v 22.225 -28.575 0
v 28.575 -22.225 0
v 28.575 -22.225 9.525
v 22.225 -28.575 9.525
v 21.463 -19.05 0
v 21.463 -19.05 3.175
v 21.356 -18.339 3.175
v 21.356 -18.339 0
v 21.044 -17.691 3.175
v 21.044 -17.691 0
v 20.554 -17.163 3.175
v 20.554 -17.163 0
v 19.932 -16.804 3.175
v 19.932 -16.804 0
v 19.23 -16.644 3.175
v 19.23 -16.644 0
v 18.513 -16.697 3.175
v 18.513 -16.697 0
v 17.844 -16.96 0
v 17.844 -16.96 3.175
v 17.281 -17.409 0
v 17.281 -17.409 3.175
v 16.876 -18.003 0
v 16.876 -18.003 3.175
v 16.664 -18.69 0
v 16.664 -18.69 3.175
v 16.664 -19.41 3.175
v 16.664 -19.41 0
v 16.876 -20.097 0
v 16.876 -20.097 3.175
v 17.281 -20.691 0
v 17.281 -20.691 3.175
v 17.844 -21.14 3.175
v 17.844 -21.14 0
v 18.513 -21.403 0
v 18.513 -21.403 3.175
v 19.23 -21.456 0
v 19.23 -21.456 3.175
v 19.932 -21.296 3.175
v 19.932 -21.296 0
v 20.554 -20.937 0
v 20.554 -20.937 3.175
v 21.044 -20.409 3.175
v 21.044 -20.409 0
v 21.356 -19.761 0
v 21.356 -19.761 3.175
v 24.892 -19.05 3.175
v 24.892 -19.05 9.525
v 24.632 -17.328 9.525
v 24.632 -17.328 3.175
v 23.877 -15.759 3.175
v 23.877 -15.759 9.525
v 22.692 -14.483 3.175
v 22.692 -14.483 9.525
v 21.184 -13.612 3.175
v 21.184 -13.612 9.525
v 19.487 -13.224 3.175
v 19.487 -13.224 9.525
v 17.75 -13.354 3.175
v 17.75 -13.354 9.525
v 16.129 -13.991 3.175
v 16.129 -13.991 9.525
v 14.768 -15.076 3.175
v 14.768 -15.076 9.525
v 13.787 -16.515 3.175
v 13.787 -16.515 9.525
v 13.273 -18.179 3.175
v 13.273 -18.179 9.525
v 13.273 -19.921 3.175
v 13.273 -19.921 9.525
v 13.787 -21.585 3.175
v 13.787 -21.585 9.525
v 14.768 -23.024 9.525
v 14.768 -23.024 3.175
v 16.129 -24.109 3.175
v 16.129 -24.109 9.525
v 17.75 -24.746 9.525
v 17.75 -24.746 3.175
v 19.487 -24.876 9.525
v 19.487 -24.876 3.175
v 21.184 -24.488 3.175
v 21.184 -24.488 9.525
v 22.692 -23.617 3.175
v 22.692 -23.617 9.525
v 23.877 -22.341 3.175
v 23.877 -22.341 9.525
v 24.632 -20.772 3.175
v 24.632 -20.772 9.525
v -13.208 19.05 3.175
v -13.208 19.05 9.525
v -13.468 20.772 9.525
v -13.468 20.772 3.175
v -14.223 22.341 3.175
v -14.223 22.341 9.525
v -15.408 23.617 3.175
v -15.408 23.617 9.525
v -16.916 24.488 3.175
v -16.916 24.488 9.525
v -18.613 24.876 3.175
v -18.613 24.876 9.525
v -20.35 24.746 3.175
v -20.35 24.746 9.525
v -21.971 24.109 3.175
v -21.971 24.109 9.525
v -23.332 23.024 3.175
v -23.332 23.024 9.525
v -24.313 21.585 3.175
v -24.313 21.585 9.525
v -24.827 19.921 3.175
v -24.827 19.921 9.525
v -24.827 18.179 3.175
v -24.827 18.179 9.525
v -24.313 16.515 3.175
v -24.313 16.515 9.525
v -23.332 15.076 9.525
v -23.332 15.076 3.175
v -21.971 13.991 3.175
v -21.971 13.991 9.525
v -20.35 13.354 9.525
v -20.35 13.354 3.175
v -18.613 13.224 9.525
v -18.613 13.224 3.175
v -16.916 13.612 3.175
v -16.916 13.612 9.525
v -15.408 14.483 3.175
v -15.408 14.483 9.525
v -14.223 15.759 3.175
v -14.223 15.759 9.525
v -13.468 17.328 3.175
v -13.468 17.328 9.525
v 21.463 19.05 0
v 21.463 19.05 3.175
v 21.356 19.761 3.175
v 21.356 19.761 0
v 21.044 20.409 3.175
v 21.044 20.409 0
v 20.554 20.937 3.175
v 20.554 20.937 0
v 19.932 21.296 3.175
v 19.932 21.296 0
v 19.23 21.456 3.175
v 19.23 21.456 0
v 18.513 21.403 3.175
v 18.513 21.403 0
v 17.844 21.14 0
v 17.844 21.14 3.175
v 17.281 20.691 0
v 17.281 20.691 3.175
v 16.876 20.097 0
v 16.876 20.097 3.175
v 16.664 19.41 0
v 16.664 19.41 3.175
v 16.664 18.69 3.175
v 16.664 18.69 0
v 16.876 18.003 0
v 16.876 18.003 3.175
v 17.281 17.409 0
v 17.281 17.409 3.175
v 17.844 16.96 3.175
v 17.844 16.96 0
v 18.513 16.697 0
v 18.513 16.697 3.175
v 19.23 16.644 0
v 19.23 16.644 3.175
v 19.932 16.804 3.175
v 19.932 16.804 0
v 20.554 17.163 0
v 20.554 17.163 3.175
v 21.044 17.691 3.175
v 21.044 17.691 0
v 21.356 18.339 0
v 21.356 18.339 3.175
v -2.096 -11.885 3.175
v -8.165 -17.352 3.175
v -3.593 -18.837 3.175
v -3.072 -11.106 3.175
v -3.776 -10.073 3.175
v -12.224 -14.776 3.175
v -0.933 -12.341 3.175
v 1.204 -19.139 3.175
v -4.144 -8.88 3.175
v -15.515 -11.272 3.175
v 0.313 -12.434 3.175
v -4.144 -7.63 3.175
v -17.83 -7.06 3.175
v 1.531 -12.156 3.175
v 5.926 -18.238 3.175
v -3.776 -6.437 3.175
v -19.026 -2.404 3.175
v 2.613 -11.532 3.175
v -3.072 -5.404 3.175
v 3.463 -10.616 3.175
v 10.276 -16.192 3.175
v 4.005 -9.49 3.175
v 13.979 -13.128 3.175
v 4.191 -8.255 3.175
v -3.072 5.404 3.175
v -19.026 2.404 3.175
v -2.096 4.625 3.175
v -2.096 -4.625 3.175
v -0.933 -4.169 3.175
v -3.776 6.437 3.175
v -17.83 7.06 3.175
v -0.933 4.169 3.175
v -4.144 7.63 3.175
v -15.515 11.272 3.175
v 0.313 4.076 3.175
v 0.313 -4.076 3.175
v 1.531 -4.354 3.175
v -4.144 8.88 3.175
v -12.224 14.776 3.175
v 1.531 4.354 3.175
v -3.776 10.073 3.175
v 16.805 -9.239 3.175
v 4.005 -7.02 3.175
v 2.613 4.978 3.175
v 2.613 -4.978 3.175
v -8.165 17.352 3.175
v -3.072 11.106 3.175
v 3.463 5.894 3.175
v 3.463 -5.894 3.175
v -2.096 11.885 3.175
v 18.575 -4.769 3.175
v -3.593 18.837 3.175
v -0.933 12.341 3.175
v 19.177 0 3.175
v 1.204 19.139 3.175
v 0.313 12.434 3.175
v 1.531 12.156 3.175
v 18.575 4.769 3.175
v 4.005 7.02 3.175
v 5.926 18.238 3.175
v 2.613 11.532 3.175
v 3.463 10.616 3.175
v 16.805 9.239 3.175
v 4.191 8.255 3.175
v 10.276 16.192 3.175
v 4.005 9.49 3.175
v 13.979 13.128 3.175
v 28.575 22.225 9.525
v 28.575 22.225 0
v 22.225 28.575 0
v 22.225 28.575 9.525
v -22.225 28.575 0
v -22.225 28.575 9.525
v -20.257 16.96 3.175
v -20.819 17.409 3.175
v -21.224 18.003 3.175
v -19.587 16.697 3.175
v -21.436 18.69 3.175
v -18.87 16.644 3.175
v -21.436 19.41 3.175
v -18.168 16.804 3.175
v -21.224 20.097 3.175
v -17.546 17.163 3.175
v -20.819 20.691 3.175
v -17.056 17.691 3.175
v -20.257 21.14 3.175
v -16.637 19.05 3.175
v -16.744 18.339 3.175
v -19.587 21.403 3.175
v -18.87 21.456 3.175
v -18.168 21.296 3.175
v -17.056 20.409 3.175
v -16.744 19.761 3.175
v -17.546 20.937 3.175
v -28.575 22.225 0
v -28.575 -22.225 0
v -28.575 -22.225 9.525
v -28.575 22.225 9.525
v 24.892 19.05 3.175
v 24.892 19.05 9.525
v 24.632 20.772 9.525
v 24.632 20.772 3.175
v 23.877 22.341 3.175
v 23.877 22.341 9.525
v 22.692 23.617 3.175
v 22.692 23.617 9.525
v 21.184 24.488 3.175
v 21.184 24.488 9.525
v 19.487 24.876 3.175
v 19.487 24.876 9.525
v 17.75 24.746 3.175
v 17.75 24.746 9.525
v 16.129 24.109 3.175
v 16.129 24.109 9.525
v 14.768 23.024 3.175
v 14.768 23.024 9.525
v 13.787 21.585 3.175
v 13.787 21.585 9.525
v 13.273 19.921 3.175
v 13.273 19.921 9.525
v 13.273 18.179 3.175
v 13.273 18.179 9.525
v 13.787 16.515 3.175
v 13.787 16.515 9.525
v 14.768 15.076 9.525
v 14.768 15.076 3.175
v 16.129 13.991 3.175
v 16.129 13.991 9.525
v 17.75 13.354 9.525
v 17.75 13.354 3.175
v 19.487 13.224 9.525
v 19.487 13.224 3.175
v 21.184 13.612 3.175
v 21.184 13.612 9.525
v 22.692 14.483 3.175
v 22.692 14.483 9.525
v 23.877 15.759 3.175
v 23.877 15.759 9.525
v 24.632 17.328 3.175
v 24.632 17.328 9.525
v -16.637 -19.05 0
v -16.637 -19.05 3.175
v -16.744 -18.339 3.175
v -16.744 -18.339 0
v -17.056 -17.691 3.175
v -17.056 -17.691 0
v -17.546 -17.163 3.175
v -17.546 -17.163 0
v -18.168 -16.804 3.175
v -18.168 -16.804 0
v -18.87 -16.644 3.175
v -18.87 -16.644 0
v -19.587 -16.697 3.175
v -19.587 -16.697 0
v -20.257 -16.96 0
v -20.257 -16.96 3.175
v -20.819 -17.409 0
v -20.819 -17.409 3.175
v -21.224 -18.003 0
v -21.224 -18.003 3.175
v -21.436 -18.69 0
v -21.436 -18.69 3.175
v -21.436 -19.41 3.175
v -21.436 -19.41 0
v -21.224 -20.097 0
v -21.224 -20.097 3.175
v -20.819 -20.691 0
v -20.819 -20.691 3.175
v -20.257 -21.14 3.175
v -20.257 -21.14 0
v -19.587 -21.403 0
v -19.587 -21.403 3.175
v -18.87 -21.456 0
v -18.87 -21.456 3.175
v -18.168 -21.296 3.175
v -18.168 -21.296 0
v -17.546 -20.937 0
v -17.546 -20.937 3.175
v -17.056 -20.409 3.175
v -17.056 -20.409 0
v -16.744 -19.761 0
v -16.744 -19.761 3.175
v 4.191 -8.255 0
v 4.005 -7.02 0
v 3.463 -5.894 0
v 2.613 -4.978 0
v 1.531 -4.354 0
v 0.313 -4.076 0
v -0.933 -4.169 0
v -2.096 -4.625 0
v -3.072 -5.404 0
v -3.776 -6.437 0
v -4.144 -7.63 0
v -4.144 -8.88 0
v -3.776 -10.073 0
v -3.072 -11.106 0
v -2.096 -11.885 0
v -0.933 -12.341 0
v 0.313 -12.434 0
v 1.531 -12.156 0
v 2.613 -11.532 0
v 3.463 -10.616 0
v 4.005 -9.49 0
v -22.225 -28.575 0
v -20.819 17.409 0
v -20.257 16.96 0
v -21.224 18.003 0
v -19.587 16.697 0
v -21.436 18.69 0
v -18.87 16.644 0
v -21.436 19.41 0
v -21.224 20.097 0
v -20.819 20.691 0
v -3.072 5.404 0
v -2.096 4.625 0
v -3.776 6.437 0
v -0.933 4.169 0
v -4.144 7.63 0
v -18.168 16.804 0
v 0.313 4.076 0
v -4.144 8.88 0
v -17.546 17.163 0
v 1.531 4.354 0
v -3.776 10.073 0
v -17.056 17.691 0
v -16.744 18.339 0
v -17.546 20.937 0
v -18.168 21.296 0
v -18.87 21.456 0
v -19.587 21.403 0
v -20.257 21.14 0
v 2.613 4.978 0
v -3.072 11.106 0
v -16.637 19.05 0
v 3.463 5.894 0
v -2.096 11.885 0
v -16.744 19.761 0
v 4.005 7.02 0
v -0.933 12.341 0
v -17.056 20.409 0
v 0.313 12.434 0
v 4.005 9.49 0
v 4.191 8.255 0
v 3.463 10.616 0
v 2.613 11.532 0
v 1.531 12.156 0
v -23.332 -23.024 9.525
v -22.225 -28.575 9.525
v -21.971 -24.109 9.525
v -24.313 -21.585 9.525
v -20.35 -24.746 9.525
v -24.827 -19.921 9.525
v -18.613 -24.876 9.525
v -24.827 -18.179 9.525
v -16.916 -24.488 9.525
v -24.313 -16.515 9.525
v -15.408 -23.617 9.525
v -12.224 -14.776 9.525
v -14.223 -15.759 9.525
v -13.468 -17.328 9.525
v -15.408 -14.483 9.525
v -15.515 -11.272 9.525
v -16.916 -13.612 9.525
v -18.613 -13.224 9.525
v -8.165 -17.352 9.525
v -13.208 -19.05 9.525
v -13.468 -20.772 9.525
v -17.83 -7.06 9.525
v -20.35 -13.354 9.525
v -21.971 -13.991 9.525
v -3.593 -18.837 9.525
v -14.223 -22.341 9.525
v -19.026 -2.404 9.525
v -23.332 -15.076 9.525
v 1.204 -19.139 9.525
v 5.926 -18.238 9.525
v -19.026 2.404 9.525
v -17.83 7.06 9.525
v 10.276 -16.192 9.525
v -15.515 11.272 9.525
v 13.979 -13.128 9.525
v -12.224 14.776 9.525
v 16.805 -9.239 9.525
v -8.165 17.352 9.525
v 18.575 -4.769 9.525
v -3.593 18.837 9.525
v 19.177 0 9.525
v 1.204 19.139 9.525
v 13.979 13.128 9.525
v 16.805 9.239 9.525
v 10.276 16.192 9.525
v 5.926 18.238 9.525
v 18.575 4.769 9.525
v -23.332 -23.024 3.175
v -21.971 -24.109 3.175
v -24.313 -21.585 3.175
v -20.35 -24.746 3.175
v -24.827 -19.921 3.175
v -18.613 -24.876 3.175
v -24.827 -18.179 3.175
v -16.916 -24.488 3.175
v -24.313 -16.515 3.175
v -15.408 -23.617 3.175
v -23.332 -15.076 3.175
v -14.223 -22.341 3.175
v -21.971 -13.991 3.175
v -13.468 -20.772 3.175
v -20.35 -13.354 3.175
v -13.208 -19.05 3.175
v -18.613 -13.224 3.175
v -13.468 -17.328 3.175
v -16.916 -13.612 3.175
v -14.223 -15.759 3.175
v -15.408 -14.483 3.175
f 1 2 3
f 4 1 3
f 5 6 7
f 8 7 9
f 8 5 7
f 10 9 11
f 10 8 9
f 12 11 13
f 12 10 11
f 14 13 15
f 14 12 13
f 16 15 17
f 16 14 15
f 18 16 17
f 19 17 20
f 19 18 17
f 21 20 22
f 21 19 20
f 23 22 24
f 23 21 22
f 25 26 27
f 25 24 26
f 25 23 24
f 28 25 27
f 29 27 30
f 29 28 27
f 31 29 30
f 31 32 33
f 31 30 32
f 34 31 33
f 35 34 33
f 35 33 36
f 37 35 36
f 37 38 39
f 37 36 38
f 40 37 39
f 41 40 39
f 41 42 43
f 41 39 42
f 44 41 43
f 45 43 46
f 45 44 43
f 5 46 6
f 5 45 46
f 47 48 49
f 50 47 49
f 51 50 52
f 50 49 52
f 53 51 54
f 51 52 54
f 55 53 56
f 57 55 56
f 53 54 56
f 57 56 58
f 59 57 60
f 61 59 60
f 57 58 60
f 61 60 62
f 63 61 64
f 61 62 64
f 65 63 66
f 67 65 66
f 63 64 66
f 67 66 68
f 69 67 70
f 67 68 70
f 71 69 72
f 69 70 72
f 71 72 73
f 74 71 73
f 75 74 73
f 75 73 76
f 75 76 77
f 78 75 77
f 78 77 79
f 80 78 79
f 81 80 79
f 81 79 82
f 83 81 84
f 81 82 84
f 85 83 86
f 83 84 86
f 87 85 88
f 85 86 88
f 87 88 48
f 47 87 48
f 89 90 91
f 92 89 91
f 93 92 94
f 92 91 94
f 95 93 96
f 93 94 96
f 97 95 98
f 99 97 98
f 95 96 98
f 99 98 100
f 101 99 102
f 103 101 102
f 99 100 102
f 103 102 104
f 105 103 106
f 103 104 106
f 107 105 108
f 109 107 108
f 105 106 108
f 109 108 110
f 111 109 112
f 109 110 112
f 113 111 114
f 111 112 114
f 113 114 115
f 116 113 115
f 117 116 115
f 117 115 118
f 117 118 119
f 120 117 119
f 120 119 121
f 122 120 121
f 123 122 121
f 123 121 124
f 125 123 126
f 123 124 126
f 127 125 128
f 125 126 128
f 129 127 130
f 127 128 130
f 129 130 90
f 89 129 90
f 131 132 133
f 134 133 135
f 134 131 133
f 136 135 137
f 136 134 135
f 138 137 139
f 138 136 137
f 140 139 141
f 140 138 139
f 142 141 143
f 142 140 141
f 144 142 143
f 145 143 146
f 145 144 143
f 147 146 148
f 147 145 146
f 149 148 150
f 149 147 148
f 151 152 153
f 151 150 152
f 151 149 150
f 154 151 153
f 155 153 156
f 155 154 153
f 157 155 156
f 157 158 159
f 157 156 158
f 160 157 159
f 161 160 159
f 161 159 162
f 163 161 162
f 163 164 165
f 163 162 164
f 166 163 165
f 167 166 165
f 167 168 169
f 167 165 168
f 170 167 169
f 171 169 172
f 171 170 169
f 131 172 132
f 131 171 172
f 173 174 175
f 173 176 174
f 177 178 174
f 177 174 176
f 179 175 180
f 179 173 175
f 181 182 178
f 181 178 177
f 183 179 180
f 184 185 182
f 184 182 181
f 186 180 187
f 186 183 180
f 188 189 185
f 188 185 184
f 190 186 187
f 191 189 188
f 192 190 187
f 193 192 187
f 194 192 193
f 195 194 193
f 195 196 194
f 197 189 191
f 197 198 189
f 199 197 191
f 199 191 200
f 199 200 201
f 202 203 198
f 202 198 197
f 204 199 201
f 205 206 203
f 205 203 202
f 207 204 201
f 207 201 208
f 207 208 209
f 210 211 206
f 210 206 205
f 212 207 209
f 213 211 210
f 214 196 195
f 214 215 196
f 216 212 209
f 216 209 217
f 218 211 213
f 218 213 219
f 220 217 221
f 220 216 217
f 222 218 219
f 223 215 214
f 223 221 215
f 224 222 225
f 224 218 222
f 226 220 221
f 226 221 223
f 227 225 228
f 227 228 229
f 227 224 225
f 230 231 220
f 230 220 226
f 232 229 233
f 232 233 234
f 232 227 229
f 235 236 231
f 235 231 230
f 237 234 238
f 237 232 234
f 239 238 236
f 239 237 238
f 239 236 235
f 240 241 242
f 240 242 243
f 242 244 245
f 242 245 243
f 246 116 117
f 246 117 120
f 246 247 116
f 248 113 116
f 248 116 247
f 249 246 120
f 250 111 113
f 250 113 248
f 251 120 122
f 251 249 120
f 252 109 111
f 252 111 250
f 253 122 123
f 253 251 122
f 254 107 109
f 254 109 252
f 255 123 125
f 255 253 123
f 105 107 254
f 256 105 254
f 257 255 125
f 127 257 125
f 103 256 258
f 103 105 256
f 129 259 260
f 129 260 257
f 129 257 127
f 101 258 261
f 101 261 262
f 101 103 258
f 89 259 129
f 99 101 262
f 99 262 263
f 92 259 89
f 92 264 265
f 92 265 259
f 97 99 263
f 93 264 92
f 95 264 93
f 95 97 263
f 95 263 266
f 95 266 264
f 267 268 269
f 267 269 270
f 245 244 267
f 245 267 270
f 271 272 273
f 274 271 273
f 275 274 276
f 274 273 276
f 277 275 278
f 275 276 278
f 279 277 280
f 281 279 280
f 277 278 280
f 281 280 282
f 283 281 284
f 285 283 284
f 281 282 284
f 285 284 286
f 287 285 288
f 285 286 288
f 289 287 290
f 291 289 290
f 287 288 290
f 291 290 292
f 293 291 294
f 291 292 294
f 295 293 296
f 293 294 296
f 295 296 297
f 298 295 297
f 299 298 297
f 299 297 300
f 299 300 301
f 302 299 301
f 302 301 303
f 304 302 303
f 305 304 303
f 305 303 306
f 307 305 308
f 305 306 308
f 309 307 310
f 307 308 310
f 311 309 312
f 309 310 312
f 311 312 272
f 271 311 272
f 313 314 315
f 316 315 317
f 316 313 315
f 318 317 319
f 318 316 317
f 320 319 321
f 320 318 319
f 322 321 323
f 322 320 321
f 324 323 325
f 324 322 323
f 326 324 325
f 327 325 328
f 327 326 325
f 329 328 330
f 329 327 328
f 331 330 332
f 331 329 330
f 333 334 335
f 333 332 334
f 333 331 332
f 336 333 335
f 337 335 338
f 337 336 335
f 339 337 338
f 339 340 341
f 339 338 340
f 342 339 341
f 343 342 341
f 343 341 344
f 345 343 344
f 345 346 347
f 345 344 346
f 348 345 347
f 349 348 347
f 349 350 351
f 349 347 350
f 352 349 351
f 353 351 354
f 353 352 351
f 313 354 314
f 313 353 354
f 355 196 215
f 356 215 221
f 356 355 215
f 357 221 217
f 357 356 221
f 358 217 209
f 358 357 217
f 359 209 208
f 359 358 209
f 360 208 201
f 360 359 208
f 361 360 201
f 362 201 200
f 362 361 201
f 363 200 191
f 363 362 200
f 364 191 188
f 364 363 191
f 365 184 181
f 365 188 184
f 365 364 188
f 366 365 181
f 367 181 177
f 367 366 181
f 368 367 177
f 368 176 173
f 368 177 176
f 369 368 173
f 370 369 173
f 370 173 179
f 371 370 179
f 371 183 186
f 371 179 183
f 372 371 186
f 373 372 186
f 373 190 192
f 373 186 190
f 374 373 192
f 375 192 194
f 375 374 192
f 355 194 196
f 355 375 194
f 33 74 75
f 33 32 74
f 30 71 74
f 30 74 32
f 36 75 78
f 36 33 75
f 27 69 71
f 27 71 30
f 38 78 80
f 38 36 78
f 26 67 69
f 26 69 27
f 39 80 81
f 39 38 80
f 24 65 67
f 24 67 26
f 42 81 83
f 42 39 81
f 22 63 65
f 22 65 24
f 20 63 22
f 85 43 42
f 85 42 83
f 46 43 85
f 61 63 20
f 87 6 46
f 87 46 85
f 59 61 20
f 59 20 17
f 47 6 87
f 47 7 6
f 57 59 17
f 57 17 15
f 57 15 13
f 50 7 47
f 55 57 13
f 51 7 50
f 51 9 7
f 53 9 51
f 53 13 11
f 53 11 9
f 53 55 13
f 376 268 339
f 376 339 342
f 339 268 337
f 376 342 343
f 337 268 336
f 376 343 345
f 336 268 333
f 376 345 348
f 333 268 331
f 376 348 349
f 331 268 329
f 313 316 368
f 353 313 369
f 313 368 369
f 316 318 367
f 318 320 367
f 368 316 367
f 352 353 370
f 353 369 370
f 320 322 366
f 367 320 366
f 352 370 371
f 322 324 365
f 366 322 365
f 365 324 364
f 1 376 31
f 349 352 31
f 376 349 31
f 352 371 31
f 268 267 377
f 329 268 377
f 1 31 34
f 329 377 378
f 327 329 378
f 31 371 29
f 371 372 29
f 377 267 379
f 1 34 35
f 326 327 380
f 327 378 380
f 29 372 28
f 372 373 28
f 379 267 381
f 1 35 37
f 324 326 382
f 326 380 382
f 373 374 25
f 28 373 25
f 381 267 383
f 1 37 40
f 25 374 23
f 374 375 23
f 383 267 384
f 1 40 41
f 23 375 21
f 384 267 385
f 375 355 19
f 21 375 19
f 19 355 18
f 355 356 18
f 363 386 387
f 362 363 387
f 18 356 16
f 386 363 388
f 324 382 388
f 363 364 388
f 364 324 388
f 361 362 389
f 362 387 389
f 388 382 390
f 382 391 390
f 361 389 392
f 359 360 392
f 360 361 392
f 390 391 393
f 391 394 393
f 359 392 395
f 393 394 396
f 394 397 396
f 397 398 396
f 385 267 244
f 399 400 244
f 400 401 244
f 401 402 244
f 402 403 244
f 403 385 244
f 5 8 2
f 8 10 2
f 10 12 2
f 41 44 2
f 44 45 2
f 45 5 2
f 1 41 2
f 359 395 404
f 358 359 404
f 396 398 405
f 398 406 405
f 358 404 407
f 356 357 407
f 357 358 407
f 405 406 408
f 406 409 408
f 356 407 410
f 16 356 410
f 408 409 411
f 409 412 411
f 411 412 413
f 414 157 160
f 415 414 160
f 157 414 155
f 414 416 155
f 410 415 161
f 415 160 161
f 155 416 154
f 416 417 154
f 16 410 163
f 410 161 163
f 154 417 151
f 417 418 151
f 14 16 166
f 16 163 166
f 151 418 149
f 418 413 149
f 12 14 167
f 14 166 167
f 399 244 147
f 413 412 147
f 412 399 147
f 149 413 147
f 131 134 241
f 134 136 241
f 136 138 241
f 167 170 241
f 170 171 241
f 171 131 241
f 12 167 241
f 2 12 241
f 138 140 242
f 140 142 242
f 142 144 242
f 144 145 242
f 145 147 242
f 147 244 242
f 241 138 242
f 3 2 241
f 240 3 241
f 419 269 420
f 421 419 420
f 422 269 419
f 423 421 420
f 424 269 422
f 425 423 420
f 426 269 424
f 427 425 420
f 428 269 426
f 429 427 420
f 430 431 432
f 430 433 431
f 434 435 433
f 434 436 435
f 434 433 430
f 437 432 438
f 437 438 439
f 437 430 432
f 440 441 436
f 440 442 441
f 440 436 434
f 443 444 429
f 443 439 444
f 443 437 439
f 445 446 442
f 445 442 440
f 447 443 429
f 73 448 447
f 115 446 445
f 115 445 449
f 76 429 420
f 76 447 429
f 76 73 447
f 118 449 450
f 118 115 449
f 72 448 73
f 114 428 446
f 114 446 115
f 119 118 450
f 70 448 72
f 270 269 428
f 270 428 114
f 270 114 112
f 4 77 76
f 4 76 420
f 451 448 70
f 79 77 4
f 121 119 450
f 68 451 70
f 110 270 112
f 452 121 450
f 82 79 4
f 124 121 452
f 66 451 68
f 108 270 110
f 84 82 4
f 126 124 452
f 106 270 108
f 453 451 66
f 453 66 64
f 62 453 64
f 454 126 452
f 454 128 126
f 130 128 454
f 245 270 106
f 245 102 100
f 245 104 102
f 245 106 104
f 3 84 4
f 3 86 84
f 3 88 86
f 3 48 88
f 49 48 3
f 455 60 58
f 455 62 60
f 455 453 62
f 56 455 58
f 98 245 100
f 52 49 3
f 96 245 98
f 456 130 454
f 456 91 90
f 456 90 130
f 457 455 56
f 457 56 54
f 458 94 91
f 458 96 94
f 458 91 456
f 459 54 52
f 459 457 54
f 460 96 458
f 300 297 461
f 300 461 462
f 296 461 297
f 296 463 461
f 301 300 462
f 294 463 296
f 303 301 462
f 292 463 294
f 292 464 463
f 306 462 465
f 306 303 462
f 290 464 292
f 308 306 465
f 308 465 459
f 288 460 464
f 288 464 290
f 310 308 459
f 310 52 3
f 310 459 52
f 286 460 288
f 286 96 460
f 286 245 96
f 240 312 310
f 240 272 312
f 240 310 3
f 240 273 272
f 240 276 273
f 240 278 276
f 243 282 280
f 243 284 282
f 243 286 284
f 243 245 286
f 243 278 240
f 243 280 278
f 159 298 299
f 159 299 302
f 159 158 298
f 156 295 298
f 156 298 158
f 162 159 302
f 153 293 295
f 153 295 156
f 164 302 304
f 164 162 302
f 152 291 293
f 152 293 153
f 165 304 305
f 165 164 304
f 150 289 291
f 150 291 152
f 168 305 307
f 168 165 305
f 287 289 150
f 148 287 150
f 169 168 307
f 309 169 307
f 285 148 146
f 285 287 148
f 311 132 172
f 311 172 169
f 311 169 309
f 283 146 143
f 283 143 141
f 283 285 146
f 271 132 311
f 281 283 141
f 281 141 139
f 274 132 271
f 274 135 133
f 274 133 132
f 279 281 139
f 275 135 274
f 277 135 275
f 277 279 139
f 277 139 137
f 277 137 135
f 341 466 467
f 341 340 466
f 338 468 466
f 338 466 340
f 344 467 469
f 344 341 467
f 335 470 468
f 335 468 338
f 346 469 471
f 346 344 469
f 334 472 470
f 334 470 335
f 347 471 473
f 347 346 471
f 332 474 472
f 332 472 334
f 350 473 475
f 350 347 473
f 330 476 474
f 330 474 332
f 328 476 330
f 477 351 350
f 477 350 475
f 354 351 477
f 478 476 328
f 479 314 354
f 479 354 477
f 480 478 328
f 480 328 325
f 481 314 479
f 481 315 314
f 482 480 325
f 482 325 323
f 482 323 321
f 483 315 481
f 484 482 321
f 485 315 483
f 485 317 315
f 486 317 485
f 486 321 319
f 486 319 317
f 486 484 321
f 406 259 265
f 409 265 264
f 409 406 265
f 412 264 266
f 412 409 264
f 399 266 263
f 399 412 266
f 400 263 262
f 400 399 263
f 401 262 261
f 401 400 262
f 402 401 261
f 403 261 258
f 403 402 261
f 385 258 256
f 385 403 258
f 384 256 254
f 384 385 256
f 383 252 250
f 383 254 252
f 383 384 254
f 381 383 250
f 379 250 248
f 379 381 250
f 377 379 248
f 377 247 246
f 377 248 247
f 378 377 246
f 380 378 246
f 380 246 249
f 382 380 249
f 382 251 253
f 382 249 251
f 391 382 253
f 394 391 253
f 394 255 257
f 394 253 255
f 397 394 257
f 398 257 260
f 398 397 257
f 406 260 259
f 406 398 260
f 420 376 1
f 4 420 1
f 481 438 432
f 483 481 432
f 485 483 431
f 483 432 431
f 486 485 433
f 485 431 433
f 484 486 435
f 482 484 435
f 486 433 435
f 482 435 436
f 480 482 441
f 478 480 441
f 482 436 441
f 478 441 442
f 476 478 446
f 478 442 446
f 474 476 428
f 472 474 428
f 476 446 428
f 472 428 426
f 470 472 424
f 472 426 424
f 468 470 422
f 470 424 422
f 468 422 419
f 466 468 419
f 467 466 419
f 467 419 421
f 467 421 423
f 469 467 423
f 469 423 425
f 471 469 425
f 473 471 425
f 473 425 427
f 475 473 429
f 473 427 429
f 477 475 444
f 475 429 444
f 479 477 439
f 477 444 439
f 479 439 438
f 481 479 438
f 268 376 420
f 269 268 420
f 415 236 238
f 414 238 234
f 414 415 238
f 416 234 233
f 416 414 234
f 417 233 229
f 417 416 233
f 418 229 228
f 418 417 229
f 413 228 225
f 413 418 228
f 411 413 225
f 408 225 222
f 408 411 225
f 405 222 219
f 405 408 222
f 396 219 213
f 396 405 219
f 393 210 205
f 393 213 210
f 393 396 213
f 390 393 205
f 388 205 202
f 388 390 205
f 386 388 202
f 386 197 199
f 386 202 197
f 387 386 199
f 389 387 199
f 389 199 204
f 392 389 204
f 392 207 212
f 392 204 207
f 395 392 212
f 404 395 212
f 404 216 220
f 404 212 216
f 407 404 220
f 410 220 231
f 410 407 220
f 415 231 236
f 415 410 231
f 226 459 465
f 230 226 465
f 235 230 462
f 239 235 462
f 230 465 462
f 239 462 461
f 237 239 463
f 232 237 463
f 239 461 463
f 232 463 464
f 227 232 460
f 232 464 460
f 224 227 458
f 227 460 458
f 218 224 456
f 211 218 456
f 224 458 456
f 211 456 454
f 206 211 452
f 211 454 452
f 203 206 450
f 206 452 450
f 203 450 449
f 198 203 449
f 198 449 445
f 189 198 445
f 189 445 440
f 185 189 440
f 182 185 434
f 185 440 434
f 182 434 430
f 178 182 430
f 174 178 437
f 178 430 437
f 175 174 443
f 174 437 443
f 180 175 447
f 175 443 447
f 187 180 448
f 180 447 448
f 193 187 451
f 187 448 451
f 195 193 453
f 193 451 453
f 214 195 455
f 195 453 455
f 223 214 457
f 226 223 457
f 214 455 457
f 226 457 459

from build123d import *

# Parameters (mm, degrees)
F0_W     = 57.15
F0_H     = 57.15
F1_DEPTH = 9.525
F2_R     = 19.177
F3_DEPTH = 6.35
F4_R     = 2.413
F5_DEPTH = 9.526
F7_R     = 4.191
F8_DEPTH = 9.526
F6_R     = 5.842
F9_DEPTH = 6.35
F10_SIZE = 6.35


with BuildPart() as f1:
    # F0 (on Top) → F1 (new body)
    with BuildSketch(Plane.XY):
        Rectangle(F0_W, F0_H)
    extrude(amount=F1_DEPTH)

    # F2 (on face) → F3 (cut)
    with BuildSketch(Plane.XY.offset(9.525)):
        Circle(F2_R)
    extrude(amount=-F3_DEPTH, mode=Mode.SUBTRACT)

    # F4 (on Top) → F5 (cut, through all)
    with BuildSketch(Plane.XY):
        with Locations((-19.05, 19.050001)):
            Circle(F4_R)
        with Locations((19.05, 19.050001)):
            Circle(F4_R)
        with Locations((-19.05, -19.050001)):
            Circle(F4_R)
        with Locations((19.05, -19.050001)):
            Circle(F4_R)
    extrude(amount=F5_DEPTH, mode=Mode.SUBTRACT)

    # F7 (on Top) → F8 (cut, through all)
    with BuildSketch(Plane.XY):
        with Locations((0, 8.255)):
            Circle(F7_R)
        with Locations((0, -8.255)):
            Circle(F7_R)
    extrude(amount=F8_DEPTH, mode=Mode.SUBTRACT)

    # F6 (on face) → F9 (cut)
    with BuildSketch(Plane.XY.offset(9.525)):
        with Locations((-19.05, 19.050001)):
            Circle(F6_R)
        with Locations((19.05, 19.050001)):
            Circle(F6_R)
        with Locations((-19.05, -19.050001)):
            Circle(F6_R)
        with Locations((19.05, -19.050001)):
            Circle(F6_R)
    extrude(amount=-F9_DEPTH, mode=Mode.SUBTRACT)

    # F10
    f10_edges = [f1.edges().sort_by_distance(p)[0] for p in [
        (-28.575, -28.575, 4.7625),
        (28.575, -28.575, 4.7625),
        (28.575, 28.575, 4.7625),
        (-28.575, 28.575, 4.7625),
    ]]
    chamfer(f10_edges, length=F10_SIZE)


solid = f1.part
